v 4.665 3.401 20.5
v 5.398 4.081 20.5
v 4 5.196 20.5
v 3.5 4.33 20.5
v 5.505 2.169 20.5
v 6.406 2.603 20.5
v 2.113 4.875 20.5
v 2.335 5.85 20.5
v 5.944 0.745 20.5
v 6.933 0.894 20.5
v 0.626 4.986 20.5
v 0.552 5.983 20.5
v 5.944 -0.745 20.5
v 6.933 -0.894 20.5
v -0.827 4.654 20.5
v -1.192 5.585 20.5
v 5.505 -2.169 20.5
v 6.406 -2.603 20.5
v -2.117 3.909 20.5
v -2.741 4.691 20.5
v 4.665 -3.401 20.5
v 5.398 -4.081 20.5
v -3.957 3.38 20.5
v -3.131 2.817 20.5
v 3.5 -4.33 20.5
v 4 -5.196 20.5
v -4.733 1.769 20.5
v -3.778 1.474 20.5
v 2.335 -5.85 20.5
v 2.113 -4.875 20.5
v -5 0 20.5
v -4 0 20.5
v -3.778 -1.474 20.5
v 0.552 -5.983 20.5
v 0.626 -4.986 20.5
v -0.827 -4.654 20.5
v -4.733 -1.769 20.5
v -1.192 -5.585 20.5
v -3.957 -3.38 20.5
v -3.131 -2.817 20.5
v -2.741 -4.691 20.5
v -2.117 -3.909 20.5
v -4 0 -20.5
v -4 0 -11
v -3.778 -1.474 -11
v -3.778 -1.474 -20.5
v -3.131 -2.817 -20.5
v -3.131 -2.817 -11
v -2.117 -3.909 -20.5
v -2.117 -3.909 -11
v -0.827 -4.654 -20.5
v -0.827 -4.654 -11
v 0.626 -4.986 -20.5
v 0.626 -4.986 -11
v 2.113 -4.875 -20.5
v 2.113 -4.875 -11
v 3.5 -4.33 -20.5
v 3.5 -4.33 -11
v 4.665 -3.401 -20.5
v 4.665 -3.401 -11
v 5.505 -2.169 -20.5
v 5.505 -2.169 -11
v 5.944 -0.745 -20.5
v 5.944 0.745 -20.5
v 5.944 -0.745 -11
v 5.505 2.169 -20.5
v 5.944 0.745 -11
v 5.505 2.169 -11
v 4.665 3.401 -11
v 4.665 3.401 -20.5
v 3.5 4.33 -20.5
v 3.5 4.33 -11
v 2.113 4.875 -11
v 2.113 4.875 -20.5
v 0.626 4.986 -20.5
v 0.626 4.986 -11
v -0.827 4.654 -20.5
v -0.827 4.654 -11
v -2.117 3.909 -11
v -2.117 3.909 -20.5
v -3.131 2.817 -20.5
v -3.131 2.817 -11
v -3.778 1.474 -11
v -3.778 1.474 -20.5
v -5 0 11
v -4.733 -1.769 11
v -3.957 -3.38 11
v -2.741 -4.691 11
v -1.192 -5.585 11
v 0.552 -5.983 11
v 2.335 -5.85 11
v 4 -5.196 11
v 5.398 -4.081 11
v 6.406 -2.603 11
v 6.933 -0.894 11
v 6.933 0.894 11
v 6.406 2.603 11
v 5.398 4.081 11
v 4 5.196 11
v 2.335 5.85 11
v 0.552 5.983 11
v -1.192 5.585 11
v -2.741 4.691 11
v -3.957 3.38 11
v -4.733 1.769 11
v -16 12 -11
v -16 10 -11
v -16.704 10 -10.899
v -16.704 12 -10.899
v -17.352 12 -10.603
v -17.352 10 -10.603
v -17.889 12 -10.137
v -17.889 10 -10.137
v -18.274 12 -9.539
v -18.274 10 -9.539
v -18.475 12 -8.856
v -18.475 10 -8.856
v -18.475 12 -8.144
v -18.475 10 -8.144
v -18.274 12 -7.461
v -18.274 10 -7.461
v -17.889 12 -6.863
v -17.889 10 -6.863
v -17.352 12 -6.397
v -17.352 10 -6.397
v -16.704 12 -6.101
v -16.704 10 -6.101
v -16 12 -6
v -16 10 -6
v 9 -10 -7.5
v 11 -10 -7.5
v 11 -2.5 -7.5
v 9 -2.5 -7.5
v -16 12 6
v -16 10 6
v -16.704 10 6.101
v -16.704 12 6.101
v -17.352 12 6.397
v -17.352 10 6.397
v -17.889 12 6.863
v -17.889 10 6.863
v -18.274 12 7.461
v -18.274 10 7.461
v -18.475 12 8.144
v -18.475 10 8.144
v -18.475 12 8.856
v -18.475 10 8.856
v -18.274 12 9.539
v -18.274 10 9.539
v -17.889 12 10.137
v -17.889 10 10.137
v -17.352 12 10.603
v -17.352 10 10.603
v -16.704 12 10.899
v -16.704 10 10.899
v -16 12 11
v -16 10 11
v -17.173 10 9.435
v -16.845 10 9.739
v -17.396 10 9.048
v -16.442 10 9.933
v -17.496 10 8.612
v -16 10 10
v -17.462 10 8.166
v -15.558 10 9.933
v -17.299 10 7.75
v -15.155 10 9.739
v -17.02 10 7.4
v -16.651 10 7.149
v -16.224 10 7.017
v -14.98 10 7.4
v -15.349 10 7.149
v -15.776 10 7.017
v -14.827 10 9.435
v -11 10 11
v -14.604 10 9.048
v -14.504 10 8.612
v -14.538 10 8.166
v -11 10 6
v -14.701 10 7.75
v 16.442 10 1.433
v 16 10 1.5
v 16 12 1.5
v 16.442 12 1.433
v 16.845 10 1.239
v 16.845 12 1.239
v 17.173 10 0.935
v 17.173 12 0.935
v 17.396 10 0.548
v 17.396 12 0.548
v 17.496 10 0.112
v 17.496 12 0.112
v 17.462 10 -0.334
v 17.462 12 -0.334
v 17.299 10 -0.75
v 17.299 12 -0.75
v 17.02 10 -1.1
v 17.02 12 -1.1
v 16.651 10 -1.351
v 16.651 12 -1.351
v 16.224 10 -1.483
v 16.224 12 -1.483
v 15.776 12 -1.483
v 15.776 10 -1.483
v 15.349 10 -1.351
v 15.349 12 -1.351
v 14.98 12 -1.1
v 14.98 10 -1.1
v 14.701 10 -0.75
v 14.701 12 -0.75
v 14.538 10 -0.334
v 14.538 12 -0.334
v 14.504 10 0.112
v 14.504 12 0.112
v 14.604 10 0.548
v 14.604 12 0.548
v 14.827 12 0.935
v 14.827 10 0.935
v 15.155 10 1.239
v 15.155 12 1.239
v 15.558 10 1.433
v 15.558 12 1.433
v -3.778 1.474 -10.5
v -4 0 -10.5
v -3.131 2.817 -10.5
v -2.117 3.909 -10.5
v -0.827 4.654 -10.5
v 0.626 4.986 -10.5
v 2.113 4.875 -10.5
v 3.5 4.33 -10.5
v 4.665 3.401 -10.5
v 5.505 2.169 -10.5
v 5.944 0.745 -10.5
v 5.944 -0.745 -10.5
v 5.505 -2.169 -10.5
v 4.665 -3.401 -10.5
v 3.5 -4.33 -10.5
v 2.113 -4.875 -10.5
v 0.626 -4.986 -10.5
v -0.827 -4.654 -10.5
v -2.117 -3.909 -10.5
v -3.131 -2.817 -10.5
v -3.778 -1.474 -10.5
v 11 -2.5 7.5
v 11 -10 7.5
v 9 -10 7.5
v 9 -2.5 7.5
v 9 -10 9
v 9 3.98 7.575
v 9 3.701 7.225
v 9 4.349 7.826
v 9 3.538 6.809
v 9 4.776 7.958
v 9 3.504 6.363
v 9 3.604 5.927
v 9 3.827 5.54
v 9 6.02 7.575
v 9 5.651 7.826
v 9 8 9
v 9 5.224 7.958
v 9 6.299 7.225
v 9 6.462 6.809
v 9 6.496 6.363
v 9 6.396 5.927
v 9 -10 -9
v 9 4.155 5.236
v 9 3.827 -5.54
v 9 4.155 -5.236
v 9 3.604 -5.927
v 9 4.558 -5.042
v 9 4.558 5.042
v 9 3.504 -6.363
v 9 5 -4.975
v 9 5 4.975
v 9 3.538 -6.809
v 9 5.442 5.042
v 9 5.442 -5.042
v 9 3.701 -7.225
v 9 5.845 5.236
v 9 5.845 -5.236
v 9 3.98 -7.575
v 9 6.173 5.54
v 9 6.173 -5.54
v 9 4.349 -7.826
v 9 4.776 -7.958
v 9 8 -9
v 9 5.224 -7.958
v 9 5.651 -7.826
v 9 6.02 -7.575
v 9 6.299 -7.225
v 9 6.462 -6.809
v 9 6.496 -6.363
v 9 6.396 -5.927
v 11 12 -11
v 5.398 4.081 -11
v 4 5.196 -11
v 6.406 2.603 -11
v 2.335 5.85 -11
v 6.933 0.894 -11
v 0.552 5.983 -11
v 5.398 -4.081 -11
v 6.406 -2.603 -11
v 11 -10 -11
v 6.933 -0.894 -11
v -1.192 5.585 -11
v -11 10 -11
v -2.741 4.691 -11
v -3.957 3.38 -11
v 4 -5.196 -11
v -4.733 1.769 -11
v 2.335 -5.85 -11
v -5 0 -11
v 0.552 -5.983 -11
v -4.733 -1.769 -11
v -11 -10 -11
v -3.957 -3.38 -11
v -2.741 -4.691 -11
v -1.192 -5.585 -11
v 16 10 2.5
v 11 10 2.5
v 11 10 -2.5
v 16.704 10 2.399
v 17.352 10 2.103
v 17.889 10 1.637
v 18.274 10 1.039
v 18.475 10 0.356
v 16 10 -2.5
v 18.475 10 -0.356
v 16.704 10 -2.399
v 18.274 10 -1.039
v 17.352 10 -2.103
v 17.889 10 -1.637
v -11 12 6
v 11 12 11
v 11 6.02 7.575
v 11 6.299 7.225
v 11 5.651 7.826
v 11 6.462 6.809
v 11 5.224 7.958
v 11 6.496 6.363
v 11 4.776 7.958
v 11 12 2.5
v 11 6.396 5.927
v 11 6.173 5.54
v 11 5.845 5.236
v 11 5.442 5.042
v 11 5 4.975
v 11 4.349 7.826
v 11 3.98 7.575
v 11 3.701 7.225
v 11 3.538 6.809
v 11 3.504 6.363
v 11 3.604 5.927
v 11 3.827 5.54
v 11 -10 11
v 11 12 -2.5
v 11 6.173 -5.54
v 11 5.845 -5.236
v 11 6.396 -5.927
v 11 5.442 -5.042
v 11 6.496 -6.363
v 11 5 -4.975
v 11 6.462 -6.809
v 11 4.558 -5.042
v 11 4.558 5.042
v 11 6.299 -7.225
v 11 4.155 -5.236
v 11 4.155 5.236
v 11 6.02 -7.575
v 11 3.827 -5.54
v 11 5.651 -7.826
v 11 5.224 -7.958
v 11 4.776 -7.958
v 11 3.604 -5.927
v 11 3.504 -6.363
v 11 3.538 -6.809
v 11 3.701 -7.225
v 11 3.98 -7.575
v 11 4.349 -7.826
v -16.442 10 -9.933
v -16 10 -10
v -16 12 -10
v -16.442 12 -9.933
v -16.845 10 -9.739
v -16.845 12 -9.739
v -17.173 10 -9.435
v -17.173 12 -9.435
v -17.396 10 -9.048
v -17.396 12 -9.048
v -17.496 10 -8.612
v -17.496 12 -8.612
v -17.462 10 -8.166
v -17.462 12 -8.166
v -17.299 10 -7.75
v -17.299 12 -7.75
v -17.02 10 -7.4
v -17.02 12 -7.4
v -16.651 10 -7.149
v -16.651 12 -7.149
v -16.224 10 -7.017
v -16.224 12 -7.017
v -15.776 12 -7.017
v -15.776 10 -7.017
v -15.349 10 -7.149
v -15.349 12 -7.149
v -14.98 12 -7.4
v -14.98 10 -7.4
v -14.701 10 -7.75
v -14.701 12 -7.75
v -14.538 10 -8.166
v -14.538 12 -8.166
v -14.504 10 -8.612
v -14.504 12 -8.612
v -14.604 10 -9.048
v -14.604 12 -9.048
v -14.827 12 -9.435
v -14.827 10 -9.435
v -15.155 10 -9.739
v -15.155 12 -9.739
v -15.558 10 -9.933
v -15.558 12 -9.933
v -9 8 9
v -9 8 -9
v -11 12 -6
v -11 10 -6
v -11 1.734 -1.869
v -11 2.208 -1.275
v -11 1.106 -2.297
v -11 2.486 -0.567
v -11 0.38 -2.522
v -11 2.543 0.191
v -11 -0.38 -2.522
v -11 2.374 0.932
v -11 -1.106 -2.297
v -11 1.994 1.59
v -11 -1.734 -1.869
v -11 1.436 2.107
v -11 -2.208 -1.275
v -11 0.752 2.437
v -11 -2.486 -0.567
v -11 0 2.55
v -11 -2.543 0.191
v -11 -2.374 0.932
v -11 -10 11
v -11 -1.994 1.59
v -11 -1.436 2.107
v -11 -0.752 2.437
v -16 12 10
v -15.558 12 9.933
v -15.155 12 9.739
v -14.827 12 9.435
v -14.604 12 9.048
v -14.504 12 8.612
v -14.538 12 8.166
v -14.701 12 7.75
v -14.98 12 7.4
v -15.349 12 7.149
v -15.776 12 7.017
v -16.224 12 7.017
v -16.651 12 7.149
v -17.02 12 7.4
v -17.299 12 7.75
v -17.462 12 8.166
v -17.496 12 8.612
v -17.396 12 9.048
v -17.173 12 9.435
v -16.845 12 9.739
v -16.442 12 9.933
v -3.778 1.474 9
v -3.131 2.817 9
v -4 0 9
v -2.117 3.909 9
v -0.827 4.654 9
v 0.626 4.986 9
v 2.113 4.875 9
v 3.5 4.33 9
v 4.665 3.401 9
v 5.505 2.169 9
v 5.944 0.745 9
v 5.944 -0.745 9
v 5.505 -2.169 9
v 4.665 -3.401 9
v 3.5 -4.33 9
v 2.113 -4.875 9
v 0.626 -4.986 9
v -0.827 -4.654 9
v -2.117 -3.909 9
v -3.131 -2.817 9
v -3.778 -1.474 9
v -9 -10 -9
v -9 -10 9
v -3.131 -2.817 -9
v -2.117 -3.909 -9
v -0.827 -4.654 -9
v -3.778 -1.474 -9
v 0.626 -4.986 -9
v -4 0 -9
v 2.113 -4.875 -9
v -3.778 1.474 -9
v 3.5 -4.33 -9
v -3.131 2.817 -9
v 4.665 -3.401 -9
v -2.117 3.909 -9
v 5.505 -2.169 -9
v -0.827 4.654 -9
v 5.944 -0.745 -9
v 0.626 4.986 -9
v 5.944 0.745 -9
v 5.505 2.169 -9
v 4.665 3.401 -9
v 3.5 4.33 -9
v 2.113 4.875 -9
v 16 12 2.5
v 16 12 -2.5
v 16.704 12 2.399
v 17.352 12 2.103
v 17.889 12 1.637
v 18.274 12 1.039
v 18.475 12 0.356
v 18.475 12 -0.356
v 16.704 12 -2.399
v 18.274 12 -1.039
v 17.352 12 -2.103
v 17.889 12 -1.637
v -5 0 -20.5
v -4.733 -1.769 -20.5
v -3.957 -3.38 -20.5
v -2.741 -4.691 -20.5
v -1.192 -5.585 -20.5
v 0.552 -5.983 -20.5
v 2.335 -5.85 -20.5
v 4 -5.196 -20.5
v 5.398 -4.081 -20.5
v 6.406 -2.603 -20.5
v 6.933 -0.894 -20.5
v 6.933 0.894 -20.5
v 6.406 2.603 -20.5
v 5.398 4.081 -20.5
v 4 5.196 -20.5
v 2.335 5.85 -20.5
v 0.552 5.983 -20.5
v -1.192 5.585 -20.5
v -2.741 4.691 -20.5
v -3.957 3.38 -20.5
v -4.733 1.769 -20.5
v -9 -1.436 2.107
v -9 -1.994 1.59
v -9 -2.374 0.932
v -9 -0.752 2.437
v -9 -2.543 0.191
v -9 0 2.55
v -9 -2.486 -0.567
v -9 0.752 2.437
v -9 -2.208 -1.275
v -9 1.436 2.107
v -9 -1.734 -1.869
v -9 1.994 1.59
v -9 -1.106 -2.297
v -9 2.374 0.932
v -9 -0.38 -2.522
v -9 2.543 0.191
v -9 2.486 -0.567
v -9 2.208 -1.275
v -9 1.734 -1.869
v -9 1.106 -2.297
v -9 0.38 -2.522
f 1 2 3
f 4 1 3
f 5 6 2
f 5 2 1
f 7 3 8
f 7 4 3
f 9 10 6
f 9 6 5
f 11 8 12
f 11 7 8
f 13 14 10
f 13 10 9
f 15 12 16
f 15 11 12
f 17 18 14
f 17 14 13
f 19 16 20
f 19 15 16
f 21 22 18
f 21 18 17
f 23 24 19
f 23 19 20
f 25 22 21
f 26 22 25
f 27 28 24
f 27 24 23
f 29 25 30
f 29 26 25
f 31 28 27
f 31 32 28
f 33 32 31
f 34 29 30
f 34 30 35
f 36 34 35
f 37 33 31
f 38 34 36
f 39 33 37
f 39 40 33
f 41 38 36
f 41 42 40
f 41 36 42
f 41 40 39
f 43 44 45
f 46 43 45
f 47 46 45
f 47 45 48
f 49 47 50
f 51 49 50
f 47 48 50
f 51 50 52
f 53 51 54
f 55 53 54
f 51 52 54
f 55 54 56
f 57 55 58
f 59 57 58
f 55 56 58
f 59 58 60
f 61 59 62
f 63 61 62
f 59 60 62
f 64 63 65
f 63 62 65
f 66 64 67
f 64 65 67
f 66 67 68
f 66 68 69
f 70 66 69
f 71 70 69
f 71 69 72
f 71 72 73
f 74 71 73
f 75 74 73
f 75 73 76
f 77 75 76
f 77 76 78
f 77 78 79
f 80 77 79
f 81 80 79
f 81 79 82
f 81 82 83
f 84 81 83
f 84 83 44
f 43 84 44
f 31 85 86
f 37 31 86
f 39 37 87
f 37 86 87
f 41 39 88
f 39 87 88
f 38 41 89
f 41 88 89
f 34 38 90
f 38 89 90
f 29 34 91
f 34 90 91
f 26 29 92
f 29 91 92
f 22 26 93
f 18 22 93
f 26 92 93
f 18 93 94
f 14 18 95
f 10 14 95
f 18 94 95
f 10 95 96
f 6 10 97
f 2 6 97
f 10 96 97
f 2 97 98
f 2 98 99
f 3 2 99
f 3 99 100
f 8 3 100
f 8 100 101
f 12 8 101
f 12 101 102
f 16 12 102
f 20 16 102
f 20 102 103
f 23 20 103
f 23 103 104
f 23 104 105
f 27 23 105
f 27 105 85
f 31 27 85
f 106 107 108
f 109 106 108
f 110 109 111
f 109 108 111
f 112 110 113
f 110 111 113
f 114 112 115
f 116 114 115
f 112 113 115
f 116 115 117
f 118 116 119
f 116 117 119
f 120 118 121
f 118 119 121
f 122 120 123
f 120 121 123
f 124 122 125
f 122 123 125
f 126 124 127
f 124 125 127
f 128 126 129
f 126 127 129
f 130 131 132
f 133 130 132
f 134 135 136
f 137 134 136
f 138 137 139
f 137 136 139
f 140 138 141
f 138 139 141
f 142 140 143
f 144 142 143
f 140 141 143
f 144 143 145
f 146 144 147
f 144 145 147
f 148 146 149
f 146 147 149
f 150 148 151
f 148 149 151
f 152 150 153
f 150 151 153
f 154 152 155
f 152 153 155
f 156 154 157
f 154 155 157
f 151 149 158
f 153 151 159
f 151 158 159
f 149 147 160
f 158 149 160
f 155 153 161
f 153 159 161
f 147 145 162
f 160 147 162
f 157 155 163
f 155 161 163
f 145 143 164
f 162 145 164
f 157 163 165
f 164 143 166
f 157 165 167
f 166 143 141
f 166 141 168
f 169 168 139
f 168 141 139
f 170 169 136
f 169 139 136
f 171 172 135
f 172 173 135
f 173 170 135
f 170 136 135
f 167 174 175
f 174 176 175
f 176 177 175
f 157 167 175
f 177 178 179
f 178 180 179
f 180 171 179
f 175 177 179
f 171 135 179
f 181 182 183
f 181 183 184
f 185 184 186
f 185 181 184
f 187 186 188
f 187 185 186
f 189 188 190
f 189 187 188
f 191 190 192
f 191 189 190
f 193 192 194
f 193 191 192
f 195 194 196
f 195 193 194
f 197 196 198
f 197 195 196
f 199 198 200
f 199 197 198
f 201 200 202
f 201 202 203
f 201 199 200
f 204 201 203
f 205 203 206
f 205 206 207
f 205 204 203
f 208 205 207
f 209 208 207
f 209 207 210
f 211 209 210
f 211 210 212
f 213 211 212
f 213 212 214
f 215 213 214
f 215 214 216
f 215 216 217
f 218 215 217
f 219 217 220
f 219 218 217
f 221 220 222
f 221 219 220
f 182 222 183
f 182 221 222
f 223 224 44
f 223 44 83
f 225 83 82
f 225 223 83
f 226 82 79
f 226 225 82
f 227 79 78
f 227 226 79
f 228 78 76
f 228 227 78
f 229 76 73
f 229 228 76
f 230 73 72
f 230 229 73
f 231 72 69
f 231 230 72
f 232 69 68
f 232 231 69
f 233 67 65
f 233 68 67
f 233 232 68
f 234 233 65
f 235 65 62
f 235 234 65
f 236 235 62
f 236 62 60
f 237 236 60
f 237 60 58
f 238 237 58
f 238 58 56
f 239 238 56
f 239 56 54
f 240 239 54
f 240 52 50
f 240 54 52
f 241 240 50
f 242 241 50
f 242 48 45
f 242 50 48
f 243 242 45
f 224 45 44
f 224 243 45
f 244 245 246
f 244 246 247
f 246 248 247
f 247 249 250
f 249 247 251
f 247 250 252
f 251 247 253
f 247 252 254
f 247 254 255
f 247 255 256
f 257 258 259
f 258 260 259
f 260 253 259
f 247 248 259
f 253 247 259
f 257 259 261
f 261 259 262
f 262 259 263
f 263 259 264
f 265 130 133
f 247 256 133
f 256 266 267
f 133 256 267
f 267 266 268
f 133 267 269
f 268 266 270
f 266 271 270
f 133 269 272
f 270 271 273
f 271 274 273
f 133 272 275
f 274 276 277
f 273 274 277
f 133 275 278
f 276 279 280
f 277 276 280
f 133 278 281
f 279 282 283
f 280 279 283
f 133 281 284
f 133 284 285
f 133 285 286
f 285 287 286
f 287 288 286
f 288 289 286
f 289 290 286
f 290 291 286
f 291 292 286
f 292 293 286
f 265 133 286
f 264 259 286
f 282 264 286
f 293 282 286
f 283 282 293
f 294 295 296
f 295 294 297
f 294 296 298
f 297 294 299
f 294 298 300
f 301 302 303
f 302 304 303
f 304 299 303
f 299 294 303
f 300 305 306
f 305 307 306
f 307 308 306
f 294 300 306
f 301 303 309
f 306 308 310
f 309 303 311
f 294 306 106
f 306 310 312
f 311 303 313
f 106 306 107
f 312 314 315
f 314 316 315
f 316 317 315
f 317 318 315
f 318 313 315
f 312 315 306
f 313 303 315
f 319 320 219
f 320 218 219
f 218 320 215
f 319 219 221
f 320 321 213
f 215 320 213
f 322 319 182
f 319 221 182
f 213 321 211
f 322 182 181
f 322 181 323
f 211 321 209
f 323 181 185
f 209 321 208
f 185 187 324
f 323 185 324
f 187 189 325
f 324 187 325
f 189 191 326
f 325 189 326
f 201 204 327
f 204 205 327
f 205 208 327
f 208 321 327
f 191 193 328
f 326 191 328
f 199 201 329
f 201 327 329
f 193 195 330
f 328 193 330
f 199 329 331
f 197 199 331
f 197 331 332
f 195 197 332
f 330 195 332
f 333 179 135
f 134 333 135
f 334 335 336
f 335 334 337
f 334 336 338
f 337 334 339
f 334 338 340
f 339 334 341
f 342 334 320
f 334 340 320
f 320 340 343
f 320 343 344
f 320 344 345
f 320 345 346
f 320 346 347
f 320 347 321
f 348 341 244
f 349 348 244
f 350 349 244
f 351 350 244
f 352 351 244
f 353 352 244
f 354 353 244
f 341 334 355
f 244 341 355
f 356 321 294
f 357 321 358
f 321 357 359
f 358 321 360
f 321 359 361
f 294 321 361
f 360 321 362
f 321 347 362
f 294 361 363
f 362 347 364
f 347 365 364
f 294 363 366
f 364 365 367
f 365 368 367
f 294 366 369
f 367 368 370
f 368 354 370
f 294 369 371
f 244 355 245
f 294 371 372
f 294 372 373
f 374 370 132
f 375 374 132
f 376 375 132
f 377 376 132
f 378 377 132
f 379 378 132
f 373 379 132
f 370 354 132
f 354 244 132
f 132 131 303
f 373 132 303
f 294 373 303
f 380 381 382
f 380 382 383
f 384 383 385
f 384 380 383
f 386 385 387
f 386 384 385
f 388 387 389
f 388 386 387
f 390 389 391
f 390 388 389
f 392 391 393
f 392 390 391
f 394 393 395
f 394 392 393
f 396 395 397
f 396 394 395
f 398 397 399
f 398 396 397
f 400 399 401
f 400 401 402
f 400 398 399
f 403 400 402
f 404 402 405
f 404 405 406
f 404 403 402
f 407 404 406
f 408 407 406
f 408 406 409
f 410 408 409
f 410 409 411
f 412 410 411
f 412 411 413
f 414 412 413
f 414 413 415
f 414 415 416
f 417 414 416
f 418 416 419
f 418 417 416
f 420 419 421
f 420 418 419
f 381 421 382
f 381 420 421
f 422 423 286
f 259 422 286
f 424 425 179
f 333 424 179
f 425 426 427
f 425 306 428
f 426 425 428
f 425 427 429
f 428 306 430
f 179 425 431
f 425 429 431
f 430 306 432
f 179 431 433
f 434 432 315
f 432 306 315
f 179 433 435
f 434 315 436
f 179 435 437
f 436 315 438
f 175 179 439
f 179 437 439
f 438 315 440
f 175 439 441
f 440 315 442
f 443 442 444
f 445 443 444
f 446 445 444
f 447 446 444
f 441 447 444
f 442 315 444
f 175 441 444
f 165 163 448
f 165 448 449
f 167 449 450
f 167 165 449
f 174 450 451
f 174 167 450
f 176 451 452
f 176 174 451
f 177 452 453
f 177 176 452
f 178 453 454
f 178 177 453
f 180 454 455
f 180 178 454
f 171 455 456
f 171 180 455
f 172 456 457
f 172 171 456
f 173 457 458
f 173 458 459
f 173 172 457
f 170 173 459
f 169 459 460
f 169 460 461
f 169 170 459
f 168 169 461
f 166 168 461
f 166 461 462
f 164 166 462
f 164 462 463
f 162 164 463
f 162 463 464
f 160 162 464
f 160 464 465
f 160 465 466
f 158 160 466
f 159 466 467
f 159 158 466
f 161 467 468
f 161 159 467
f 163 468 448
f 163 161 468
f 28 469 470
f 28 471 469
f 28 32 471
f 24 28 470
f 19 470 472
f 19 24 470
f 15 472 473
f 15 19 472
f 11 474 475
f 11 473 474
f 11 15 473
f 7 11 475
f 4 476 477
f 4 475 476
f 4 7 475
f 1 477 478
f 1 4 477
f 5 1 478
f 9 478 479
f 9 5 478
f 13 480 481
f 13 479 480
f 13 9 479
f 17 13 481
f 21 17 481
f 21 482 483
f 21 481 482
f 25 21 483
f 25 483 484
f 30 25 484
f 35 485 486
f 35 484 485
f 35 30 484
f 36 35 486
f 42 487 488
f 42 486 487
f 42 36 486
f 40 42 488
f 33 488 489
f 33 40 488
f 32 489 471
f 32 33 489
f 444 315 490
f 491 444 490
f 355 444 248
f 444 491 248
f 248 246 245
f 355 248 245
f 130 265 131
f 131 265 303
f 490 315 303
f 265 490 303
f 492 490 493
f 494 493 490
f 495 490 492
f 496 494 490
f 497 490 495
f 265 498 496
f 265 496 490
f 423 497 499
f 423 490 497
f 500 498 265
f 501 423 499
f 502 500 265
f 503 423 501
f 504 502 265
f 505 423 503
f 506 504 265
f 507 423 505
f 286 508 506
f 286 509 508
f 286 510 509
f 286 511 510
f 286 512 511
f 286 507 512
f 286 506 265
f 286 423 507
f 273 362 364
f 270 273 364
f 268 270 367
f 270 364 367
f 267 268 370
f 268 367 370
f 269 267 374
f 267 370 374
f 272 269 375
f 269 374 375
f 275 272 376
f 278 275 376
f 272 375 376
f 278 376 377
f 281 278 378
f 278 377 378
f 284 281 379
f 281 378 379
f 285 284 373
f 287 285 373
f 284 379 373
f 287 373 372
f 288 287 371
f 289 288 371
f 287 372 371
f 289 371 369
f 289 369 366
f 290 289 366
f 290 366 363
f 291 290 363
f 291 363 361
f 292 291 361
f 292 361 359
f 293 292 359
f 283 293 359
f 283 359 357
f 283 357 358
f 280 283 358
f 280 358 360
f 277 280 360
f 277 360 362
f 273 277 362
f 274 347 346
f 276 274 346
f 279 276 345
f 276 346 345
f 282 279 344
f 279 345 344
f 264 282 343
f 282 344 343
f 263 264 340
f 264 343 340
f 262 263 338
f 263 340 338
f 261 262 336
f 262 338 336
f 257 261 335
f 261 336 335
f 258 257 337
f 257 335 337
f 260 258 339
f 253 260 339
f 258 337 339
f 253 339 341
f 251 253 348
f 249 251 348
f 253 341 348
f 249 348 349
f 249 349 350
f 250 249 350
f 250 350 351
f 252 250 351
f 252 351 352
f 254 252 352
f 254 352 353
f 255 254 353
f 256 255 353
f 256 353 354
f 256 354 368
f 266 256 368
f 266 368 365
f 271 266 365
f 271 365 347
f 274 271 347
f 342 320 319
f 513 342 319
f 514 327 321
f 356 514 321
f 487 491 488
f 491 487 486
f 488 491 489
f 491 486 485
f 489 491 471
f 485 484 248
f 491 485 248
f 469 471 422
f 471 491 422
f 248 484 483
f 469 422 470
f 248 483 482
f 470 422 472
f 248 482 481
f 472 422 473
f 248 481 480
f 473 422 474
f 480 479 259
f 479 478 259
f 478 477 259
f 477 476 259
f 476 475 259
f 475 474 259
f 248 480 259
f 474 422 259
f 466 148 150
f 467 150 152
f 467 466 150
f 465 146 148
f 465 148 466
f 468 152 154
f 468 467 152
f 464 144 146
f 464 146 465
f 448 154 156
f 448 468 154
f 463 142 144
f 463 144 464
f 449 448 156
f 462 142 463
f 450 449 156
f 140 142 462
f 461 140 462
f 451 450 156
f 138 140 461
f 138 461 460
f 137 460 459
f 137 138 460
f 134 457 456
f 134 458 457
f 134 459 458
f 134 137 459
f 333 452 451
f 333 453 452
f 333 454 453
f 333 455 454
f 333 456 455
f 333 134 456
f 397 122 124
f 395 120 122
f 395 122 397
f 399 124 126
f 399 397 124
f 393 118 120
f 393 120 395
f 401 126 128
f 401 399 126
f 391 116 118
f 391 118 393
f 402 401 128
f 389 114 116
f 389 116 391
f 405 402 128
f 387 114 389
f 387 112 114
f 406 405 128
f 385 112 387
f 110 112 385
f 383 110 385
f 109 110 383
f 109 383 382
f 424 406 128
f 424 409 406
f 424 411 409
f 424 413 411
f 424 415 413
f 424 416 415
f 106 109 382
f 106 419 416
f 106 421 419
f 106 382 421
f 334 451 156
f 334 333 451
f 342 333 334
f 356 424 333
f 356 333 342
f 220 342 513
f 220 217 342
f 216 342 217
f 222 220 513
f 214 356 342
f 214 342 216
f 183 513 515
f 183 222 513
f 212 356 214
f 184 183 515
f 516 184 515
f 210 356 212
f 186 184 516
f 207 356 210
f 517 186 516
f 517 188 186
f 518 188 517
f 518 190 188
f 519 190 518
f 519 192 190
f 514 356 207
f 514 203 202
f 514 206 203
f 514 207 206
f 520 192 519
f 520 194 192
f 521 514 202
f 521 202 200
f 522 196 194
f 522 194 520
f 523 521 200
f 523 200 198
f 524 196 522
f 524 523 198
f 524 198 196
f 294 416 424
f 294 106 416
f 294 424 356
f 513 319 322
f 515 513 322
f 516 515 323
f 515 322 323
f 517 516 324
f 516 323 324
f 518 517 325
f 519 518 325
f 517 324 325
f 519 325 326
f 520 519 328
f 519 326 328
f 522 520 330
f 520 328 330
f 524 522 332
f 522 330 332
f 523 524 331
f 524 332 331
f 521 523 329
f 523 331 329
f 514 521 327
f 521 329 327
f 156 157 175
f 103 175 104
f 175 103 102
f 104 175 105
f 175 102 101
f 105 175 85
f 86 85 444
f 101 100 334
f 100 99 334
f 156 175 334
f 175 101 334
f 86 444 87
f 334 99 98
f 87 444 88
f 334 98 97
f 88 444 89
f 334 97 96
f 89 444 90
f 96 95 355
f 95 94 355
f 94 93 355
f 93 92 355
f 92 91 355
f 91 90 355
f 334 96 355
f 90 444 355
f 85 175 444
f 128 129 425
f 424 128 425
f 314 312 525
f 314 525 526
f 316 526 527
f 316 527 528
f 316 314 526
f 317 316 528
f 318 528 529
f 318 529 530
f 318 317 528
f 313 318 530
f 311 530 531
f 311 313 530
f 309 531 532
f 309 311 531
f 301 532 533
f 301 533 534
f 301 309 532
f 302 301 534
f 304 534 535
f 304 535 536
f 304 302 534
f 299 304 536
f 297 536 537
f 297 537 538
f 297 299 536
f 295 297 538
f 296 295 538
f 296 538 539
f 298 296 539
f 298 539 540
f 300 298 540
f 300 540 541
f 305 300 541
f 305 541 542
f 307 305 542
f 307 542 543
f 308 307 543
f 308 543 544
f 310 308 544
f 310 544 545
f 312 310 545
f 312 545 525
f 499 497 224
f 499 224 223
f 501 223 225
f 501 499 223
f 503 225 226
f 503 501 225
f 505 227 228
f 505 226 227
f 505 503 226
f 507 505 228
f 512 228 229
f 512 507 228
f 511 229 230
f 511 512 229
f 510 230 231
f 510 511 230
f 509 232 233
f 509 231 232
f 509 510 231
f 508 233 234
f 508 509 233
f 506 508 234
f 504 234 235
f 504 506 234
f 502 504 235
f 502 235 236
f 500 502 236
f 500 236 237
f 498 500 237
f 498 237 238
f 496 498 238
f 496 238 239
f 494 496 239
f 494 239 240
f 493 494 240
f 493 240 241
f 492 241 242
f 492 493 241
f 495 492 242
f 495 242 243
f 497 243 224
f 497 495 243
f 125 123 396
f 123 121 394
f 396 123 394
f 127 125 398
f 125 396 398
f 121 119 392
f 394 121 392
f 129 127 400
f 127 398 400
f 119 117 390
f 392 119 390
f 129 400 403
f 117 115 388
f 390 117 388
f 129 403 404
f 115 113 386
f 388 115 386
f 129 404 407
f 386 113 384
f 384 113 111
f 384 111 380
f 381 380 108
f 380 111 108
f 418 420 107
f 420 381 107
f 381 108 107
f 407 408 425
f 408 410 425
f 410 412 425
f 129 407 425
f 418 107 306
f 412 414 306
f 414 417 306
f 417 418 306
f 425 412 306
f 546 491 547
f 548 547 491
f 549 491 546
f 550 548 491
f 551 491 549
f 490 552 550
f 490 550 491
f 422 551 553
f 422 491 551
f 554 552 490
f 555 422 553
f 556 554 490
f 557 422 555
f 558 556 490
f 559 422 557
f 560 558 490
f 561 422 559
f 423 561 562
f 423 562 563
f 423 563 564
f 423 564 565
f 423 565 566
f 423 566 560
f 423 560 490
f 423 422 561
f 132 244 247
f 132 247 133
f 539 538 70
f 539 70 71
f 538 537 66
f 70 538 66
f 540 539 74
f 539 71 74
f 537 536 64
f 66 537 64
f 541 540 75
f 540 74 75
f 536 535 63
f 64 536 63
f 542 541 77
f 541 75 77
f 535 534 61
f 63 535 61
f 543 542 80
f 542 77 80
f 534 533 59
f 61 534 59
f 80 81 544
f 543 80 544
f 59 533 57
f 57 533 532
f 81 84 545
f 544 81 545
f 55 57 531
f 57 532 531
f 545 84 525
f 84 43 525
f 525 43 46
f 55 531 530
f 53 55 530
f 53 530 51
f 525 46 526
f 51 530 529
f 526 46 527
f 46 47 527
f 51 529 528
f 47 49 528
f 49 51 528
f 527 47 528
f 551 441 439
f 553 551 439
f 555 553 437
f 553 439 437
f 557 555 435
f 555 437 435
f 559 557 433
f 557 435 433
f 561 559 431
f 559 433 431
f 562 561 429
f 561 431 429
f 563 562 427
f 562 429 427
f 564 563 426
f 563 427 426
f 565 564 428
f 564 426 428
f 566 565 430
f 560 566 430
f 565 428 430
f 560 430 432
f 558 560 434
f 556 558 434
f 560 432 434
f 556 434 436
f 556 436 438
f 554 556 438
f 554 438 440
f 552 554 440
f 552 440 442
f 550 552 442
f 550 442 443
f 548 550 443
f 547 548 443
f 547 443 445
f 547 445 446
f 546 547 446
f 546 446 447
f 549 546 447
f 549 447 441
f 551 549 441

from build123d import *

# Parameters (mm, degrees)
SKETCH1_W               = 22
SKETCH1_H               = 22
BOSS_EXTRUDE1_DEPTH     = 10
SHELL1_T                = -2
SKETCH2_R               = 1.5
SKETCH2_W               = 15
SKETCH2_H               = 7.5
CUT_EXTRUDE1_DEPTH      = 8
SKETCH3_R               = 2.55
CUT_EXTRUDE2_DEPTH      = 8
CUT_EXTRUDE3_DEPTH      = 27.551836095
CUT_EXTRUDE3_DEPTH_BACK = 27.551836095
SKETCH4_R               = 5
BOSS_EXTRUDE2_START     = 10.5
SKETCH5_R               = 6
SKETCH5_R_2             = 5
BOSS_EXTRUDE2_DEPTH     = 10
SKETCH7_R               = 1.5
BOSS_EXTRUDE3_DEPTH     = 2


with BuildPart() as part:
    # Sketch1 → Boss-Extrude1 (new, symmetric)
    with BuildSketch(Plane(origin=(0, 0, 0), x_dir=(1, 0, 0), z_dir=(0, 1, 0))):
        Rectangle(SKETCH1_W, SKETCH1_H)
    extrude(amount=BOSS_EXTRUDE1_DEPTH, both=True)

    # Shell1
    shell1_openings = [part.faces().sort_by_distance(p)[0] for p in [
        (0, -10, 0),
    ]]
    offset(amount=SHELL1_T, openings=shell1_openings, kind=Kind.INTERSECTION)

    # Sketch2 → Cut-Extrude1 (cut)
    with BuildSketch(Plane(origin=(11, 0, 0), x_dir=(0, 0, -1), z_dir=(1, 0, 0))):
        with Locations((-6.475, 5)):
            Circle(SKETCH2_R)
        with Locations(Location((6.475, 5, 0), (0, 0, 180))):
            Circle(SKETCH2_R)
        with Locations((0, -6.25)):
            Rectangle(SKETCH2_W, SKETCH2_H)
    extrude(amount=-CUT_EXTRUDE1_DEPTH, mode=Mode.SUBTRACT)

    # Sketch3 → Cut-Extrude2 (cut)
    with BuildSketch(Plane.ZY.offset(11)):
        Circle(SKETCH3_R)
    extrude(amount=-CUT_EXTRUDE2_DEPTH, mode=Mode.SUBTRACT)

    # Sketch4 → Cut-Extrude3 (cut, two sides: drawn at the far end of the back side and taken through both)
    with BuildSketch(Plane(origin=(0, 0, -11), x_dir=(-1, 0, 0), z_dir=(0, 0, -1)).offset(-CUT_EXTRUDE3_DEPTH_BACK)):
        with Locations((-1, 0)):
            Circle(SKETCH4_R)
    extrude(amount=CUT_EXTRUDE3_DEPTH + CUT_EXTRUDE3_DEPTH_BACK, mode=Mode.SUBTRACT)

    # Sketch5 → Boss-Extrude2 (add)
    with BuildSketch(Plane.XY.offset(BOSS_EXTRUDE2_START)):
        with Locations(Location((1, 0, 0), (0, 0, 180))):
            Circle(SKETCH5_R)
        with Locations(Location((1, 0, 0), (0, 0, 180))):
            Circle(SKETCH5_R_2, mode=Mode.SUBTRACT)
    boss_extrude2 = extrude(amount=BOSS_EXTRUDE2_DEPTH)

    # Mirror4: Boss-Extrude2 across plane
    add(boss_extrude2.mirror(Plane.XY))

    # Sketch7 → Boss-Extrude3 (add)
    with BuildSketch(Plane(origin=(0, 10, 0), x_dir=(1, 0, 0), z_dir=(0, 1, 0))):
        with BuildLine():
            Line((-11, -6), (-16, -6))
            ThreePointArc((-16, -6), (-18.5, -8.5), (-16, -11))
            Line((-16, -11), (-11, -11))
            Line((-11, -11), (11, -11))
            Line((11, -11), (11, -2.5))
            Line((11, -2.5), (16, -2.5))
            ThreePointArc((16, -2.5), (18.5, 0), (16, 2.5))
            Line((16, 2.5), (11, 2.5))
            Line((11, 2.5), (11, 11))
            Line((11, 11), (-11, 11))
            Line((-11, 11), (-16, 11))
            ThreePointArc((-16, 11), (-18.5, 8.5), (-16, 6))
            Line((-16, 6), (-11, 6))
            Line((-11, 6), (-11, -6))
        make_face()
        with Locations(Location((-16, -8.5, 0), (0, 0, 270))):
            Circle(SKETCH7_R, mode=Mode.SUBTRACT)
        with Locations(Location((-16, 8.5, 0), (0, 0, 90))):
            Circle(SKETCH7_R, mode=Mode.SUBTRACT)
        with Locations(Location((16, 0, 0), (0, 0, 270))):
            Circle(SKETCH7_R, mode=Mode.SUBTRACT)
    extrude(amount=BOSS_EXTRUDE3_DEPTH)


solid = part.part
